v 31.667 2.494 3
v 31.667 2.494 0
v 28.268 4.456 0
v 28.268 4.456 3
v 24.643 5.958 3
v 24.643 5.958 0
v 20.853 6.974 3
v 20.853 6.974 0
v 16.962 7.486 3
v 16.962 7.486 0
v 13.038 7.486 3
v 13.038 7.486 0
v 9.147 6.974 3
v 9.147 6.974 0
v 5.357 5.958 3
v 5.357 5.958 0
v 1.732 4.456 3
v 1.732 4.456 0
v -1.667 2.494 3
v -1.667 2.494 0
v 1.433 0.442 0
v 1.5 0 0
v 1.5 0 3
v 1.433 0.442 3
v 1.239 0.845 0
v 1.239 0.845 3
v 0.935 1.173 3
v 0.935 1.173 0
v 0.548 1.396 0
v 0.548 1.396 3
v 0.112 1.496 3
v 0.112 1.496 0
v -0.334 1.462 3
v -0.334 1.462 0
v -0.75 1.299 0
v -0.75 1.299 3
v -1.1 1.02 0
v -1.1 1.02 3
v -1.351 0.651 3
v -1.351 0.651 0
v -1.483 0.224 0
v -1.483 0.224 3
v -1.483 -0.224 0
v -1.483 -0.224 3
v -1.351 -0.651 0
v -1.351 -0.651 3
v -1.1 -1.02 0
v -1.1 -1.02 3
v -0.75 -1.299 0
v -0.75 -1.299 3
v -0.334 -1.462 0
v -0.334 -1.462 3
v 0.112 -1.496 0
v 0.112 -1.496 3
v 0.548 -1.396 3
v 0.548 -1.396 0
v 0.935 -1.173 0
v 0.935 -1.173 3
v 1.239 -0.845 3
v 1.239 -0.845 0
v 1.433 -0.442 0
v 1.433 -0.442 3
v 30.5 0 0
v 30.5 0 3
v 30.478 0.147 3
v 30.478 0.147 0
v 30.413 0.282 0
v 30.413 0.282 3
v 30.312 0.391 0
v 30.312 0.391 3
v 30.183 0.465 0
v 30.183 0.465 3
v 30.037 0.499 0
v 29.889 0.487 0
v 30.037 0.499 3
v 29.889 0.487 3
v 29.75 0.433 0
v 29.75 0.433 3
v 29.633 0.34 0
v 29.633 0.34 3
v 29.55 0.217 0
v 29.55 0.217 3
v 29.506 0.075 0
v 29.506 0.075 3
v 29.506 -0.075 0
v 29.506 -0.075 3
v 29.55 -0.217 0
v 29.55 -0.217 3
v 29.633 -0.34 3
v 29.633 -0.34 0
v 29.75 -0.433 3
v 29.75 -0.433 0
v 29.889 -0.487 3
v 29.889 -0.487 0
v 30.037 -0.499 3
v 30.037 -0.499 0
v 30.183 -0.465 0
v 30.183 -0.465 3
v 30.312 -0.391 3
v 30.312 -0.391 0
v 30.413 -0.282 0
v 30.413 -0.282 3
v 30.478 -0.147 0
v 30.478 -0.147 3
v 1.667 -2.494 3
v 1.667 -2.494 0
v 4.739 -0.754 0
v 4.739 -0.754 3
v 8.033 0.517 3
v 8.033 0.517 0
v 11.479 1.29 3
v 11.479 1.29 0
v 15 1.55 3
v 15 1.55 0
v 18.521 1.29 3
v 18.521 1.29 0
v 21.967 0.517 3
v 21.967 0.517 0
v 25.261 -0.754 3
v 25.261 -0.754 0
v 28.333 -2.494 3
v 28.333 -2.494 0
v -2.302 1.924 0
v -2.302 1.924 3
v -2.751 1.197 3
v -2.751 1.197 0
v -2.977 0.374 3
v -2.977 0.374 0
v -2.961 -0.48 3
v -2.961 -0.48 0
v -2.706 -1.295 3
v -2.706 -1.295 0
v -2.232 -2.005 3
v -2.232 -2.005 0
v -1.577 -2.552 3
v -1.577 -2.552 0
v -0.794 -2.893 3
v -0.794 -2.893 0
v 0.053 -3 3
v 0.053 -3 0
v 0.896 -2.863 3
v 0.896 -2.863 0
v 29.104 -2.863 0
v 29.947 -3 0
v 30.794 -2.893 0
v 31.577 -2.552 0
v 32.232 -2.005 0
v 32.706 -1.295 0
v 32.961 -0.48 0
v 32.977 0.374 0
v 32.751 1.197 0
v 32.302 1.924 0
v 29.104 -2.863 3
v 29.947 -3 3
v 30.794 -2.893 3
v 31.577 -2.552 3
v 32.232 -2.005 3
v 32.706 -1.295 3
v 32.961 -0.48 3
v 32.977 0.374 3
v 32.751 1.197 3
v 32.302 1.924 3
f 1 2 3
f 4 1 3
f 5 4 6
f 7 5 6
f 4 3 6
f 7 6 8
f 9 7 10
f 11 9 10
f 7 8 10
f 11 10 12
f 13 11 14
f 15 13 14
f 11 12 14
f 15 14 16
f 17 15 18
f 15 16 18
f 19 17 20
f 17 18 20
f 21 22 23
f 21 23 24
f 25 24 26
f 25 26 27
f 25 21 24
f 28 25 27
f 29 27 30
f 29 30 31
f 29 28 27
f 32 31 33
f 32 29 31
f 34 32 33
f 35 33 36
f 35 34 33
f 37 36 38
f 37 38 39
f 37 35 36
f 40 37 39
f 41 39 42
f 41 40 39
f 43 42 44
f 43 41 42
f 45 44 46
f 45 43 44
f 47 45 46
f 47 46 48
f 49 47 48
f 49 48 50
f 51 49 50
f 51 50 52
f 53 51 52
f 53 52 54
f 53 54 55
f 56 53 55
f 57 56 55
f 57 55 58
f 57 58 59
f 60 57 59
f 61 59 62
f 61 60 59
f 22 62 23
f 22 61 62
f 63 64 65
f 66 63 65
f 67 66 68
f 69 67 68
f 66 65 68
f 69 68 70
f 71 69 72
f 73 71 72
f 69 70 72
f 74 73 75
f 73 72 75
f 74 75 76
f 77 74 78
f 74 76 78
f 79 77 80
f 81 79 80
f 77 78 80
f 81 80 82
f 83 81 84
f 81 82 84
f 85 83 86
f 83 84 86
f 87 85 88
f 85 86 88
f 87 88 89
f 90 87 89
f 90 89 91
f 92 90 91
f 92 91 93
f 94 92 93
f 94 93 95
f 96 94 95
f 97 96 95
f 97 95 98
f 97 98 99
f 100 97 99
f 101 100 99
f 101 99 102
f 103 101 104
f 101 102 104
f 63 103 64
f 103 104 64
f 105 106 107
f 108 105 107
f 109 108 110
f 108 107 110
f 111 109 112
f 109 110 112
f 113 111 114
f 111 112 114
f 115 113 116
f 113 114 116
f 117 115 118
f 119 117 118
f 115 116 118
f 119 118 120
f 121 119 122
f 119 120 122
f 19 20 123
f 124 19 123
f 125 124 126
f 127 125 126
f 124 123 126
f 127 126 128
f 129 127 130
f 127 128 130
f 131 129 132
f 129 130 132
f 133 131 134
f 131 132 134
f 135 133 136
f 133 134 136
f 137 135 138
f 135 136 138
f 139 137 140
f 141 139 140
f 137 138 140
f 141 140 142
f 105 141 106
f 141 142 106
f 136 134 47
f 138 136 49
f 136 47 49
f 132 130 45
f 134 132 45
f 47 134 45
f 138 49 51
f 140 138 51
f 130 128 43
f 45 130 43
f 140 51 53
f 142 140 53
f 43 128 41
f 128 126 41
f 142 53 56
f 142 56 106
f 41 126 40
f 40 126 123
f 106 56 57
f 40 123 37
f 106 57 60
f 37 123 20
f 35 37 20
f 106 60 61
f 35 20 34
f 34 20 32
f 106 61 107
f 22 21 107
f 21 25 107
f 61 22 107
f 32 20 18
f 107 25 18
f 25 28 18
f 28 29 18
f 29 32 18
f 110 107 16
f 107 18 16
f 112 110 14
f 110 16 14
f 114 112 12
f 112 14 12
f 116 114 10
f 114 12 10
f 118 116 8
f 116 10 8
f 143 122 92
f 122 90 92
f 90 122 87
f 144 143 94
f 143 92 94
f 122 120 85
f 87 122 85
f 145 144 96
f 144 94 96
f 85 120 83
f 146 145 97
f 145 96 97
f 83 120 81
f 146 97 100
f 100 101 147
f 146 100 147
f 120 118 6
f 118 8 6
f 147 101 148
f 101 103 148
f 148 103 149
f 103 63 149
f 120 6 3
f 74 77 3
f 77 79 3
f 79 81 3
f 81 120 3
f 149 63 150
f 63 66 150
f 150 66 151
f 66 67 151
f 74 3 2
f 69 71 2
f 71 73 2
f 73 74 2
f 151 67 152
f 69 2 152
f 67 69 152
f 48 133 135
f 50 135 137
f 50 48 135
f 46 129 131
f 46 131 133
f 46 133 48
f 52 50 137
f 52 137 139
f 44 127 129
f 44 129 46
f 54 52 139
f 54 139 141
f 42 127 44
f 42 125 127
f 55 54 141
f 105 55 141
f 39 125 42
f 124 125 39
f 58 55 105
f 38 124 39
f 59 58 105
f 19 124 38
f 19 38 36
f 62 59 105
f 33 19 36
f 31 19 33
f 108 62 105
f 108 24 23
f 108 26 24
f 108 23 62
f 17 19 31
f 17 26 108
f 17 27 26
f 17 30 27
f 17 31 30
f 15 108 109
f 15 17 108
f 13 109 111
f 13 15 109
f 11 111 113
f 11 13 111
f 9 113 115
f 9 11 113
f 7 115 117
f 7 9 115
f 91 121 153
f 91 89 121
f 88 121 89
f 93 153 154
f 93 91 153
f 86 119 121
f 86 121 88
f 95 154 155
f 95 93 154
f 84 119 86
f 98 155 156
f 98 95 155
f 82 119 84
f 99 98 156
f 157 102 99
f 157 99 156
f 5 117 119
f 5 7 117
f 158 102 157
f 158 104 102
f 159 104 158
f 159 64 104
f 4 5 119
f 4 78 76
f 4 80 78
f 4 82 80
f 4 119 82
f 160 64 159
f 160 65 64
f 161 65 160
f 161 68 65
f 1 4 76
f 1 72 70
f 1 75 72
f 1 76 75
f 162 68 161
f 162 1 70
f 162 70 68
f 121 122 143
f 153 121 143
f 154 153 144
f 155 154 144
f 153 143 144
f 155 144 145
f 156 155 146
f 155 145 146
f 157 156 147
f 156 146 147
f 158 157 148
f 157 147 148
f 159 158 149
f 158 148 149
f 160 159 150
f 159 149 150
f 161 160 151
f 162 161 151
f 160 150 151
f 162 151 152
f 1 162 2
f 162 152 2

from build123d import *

# Parameters (mm, degrees)
SKETCH_1_R      = 1.5
EXTRUDE_1_DEPTH = 3
SKETCH_2_R      = 1.5
SKETCH_2_R_2    = 0.5
EXTRUDE_2_DEPTH = 3


with BuildPart() as part:
    # 草图1 → 凸台-拉伸1 (new body)
    with BuildSketch(Plane.XY):
        with BuildLine():
            ThreePointArc((31.666666667, 2.494438258), (15, 7.550055679), (-1.666666667, 2.494438258))
            ThreePointArc((-1.666666667, 2.494438258), (-2.494438258, -1.666666667), (1.666666667, -2.494438258))
            ThreePointArc((1.666666667, -2.494438258), (15, 1.550055679), (28.333333333, -2.494438258))
            ThreePointArc((28.333333333, -2.494438258), (32.494438258, -1.666666667), (31.666666667, 2.494438258))
        make_face()
        Circle(SKETCH_1_R, mode=Mode.SUBTRACT)
        with Locations((30, 0)):
            Circle(SKETCH_1_R, mode=Mode.SUBTRACT)
    extrude(amount=EXTRUDE_1_DEPTH)

    # 草图2 → 凸台-拉伸2 (add, through all)
    with BuildSketch(Plane.XY.offset(3)):
        with Locations((30, 0)):
            Circle(SKETCH_2_R)
        with Locations((30, 0)):
            Circle(SKETCH_2_R_2, mode=Mode.SUBTRACT)
    extrude(amount=-EXTRUDE_2_DEPTH)


solid = part.part
